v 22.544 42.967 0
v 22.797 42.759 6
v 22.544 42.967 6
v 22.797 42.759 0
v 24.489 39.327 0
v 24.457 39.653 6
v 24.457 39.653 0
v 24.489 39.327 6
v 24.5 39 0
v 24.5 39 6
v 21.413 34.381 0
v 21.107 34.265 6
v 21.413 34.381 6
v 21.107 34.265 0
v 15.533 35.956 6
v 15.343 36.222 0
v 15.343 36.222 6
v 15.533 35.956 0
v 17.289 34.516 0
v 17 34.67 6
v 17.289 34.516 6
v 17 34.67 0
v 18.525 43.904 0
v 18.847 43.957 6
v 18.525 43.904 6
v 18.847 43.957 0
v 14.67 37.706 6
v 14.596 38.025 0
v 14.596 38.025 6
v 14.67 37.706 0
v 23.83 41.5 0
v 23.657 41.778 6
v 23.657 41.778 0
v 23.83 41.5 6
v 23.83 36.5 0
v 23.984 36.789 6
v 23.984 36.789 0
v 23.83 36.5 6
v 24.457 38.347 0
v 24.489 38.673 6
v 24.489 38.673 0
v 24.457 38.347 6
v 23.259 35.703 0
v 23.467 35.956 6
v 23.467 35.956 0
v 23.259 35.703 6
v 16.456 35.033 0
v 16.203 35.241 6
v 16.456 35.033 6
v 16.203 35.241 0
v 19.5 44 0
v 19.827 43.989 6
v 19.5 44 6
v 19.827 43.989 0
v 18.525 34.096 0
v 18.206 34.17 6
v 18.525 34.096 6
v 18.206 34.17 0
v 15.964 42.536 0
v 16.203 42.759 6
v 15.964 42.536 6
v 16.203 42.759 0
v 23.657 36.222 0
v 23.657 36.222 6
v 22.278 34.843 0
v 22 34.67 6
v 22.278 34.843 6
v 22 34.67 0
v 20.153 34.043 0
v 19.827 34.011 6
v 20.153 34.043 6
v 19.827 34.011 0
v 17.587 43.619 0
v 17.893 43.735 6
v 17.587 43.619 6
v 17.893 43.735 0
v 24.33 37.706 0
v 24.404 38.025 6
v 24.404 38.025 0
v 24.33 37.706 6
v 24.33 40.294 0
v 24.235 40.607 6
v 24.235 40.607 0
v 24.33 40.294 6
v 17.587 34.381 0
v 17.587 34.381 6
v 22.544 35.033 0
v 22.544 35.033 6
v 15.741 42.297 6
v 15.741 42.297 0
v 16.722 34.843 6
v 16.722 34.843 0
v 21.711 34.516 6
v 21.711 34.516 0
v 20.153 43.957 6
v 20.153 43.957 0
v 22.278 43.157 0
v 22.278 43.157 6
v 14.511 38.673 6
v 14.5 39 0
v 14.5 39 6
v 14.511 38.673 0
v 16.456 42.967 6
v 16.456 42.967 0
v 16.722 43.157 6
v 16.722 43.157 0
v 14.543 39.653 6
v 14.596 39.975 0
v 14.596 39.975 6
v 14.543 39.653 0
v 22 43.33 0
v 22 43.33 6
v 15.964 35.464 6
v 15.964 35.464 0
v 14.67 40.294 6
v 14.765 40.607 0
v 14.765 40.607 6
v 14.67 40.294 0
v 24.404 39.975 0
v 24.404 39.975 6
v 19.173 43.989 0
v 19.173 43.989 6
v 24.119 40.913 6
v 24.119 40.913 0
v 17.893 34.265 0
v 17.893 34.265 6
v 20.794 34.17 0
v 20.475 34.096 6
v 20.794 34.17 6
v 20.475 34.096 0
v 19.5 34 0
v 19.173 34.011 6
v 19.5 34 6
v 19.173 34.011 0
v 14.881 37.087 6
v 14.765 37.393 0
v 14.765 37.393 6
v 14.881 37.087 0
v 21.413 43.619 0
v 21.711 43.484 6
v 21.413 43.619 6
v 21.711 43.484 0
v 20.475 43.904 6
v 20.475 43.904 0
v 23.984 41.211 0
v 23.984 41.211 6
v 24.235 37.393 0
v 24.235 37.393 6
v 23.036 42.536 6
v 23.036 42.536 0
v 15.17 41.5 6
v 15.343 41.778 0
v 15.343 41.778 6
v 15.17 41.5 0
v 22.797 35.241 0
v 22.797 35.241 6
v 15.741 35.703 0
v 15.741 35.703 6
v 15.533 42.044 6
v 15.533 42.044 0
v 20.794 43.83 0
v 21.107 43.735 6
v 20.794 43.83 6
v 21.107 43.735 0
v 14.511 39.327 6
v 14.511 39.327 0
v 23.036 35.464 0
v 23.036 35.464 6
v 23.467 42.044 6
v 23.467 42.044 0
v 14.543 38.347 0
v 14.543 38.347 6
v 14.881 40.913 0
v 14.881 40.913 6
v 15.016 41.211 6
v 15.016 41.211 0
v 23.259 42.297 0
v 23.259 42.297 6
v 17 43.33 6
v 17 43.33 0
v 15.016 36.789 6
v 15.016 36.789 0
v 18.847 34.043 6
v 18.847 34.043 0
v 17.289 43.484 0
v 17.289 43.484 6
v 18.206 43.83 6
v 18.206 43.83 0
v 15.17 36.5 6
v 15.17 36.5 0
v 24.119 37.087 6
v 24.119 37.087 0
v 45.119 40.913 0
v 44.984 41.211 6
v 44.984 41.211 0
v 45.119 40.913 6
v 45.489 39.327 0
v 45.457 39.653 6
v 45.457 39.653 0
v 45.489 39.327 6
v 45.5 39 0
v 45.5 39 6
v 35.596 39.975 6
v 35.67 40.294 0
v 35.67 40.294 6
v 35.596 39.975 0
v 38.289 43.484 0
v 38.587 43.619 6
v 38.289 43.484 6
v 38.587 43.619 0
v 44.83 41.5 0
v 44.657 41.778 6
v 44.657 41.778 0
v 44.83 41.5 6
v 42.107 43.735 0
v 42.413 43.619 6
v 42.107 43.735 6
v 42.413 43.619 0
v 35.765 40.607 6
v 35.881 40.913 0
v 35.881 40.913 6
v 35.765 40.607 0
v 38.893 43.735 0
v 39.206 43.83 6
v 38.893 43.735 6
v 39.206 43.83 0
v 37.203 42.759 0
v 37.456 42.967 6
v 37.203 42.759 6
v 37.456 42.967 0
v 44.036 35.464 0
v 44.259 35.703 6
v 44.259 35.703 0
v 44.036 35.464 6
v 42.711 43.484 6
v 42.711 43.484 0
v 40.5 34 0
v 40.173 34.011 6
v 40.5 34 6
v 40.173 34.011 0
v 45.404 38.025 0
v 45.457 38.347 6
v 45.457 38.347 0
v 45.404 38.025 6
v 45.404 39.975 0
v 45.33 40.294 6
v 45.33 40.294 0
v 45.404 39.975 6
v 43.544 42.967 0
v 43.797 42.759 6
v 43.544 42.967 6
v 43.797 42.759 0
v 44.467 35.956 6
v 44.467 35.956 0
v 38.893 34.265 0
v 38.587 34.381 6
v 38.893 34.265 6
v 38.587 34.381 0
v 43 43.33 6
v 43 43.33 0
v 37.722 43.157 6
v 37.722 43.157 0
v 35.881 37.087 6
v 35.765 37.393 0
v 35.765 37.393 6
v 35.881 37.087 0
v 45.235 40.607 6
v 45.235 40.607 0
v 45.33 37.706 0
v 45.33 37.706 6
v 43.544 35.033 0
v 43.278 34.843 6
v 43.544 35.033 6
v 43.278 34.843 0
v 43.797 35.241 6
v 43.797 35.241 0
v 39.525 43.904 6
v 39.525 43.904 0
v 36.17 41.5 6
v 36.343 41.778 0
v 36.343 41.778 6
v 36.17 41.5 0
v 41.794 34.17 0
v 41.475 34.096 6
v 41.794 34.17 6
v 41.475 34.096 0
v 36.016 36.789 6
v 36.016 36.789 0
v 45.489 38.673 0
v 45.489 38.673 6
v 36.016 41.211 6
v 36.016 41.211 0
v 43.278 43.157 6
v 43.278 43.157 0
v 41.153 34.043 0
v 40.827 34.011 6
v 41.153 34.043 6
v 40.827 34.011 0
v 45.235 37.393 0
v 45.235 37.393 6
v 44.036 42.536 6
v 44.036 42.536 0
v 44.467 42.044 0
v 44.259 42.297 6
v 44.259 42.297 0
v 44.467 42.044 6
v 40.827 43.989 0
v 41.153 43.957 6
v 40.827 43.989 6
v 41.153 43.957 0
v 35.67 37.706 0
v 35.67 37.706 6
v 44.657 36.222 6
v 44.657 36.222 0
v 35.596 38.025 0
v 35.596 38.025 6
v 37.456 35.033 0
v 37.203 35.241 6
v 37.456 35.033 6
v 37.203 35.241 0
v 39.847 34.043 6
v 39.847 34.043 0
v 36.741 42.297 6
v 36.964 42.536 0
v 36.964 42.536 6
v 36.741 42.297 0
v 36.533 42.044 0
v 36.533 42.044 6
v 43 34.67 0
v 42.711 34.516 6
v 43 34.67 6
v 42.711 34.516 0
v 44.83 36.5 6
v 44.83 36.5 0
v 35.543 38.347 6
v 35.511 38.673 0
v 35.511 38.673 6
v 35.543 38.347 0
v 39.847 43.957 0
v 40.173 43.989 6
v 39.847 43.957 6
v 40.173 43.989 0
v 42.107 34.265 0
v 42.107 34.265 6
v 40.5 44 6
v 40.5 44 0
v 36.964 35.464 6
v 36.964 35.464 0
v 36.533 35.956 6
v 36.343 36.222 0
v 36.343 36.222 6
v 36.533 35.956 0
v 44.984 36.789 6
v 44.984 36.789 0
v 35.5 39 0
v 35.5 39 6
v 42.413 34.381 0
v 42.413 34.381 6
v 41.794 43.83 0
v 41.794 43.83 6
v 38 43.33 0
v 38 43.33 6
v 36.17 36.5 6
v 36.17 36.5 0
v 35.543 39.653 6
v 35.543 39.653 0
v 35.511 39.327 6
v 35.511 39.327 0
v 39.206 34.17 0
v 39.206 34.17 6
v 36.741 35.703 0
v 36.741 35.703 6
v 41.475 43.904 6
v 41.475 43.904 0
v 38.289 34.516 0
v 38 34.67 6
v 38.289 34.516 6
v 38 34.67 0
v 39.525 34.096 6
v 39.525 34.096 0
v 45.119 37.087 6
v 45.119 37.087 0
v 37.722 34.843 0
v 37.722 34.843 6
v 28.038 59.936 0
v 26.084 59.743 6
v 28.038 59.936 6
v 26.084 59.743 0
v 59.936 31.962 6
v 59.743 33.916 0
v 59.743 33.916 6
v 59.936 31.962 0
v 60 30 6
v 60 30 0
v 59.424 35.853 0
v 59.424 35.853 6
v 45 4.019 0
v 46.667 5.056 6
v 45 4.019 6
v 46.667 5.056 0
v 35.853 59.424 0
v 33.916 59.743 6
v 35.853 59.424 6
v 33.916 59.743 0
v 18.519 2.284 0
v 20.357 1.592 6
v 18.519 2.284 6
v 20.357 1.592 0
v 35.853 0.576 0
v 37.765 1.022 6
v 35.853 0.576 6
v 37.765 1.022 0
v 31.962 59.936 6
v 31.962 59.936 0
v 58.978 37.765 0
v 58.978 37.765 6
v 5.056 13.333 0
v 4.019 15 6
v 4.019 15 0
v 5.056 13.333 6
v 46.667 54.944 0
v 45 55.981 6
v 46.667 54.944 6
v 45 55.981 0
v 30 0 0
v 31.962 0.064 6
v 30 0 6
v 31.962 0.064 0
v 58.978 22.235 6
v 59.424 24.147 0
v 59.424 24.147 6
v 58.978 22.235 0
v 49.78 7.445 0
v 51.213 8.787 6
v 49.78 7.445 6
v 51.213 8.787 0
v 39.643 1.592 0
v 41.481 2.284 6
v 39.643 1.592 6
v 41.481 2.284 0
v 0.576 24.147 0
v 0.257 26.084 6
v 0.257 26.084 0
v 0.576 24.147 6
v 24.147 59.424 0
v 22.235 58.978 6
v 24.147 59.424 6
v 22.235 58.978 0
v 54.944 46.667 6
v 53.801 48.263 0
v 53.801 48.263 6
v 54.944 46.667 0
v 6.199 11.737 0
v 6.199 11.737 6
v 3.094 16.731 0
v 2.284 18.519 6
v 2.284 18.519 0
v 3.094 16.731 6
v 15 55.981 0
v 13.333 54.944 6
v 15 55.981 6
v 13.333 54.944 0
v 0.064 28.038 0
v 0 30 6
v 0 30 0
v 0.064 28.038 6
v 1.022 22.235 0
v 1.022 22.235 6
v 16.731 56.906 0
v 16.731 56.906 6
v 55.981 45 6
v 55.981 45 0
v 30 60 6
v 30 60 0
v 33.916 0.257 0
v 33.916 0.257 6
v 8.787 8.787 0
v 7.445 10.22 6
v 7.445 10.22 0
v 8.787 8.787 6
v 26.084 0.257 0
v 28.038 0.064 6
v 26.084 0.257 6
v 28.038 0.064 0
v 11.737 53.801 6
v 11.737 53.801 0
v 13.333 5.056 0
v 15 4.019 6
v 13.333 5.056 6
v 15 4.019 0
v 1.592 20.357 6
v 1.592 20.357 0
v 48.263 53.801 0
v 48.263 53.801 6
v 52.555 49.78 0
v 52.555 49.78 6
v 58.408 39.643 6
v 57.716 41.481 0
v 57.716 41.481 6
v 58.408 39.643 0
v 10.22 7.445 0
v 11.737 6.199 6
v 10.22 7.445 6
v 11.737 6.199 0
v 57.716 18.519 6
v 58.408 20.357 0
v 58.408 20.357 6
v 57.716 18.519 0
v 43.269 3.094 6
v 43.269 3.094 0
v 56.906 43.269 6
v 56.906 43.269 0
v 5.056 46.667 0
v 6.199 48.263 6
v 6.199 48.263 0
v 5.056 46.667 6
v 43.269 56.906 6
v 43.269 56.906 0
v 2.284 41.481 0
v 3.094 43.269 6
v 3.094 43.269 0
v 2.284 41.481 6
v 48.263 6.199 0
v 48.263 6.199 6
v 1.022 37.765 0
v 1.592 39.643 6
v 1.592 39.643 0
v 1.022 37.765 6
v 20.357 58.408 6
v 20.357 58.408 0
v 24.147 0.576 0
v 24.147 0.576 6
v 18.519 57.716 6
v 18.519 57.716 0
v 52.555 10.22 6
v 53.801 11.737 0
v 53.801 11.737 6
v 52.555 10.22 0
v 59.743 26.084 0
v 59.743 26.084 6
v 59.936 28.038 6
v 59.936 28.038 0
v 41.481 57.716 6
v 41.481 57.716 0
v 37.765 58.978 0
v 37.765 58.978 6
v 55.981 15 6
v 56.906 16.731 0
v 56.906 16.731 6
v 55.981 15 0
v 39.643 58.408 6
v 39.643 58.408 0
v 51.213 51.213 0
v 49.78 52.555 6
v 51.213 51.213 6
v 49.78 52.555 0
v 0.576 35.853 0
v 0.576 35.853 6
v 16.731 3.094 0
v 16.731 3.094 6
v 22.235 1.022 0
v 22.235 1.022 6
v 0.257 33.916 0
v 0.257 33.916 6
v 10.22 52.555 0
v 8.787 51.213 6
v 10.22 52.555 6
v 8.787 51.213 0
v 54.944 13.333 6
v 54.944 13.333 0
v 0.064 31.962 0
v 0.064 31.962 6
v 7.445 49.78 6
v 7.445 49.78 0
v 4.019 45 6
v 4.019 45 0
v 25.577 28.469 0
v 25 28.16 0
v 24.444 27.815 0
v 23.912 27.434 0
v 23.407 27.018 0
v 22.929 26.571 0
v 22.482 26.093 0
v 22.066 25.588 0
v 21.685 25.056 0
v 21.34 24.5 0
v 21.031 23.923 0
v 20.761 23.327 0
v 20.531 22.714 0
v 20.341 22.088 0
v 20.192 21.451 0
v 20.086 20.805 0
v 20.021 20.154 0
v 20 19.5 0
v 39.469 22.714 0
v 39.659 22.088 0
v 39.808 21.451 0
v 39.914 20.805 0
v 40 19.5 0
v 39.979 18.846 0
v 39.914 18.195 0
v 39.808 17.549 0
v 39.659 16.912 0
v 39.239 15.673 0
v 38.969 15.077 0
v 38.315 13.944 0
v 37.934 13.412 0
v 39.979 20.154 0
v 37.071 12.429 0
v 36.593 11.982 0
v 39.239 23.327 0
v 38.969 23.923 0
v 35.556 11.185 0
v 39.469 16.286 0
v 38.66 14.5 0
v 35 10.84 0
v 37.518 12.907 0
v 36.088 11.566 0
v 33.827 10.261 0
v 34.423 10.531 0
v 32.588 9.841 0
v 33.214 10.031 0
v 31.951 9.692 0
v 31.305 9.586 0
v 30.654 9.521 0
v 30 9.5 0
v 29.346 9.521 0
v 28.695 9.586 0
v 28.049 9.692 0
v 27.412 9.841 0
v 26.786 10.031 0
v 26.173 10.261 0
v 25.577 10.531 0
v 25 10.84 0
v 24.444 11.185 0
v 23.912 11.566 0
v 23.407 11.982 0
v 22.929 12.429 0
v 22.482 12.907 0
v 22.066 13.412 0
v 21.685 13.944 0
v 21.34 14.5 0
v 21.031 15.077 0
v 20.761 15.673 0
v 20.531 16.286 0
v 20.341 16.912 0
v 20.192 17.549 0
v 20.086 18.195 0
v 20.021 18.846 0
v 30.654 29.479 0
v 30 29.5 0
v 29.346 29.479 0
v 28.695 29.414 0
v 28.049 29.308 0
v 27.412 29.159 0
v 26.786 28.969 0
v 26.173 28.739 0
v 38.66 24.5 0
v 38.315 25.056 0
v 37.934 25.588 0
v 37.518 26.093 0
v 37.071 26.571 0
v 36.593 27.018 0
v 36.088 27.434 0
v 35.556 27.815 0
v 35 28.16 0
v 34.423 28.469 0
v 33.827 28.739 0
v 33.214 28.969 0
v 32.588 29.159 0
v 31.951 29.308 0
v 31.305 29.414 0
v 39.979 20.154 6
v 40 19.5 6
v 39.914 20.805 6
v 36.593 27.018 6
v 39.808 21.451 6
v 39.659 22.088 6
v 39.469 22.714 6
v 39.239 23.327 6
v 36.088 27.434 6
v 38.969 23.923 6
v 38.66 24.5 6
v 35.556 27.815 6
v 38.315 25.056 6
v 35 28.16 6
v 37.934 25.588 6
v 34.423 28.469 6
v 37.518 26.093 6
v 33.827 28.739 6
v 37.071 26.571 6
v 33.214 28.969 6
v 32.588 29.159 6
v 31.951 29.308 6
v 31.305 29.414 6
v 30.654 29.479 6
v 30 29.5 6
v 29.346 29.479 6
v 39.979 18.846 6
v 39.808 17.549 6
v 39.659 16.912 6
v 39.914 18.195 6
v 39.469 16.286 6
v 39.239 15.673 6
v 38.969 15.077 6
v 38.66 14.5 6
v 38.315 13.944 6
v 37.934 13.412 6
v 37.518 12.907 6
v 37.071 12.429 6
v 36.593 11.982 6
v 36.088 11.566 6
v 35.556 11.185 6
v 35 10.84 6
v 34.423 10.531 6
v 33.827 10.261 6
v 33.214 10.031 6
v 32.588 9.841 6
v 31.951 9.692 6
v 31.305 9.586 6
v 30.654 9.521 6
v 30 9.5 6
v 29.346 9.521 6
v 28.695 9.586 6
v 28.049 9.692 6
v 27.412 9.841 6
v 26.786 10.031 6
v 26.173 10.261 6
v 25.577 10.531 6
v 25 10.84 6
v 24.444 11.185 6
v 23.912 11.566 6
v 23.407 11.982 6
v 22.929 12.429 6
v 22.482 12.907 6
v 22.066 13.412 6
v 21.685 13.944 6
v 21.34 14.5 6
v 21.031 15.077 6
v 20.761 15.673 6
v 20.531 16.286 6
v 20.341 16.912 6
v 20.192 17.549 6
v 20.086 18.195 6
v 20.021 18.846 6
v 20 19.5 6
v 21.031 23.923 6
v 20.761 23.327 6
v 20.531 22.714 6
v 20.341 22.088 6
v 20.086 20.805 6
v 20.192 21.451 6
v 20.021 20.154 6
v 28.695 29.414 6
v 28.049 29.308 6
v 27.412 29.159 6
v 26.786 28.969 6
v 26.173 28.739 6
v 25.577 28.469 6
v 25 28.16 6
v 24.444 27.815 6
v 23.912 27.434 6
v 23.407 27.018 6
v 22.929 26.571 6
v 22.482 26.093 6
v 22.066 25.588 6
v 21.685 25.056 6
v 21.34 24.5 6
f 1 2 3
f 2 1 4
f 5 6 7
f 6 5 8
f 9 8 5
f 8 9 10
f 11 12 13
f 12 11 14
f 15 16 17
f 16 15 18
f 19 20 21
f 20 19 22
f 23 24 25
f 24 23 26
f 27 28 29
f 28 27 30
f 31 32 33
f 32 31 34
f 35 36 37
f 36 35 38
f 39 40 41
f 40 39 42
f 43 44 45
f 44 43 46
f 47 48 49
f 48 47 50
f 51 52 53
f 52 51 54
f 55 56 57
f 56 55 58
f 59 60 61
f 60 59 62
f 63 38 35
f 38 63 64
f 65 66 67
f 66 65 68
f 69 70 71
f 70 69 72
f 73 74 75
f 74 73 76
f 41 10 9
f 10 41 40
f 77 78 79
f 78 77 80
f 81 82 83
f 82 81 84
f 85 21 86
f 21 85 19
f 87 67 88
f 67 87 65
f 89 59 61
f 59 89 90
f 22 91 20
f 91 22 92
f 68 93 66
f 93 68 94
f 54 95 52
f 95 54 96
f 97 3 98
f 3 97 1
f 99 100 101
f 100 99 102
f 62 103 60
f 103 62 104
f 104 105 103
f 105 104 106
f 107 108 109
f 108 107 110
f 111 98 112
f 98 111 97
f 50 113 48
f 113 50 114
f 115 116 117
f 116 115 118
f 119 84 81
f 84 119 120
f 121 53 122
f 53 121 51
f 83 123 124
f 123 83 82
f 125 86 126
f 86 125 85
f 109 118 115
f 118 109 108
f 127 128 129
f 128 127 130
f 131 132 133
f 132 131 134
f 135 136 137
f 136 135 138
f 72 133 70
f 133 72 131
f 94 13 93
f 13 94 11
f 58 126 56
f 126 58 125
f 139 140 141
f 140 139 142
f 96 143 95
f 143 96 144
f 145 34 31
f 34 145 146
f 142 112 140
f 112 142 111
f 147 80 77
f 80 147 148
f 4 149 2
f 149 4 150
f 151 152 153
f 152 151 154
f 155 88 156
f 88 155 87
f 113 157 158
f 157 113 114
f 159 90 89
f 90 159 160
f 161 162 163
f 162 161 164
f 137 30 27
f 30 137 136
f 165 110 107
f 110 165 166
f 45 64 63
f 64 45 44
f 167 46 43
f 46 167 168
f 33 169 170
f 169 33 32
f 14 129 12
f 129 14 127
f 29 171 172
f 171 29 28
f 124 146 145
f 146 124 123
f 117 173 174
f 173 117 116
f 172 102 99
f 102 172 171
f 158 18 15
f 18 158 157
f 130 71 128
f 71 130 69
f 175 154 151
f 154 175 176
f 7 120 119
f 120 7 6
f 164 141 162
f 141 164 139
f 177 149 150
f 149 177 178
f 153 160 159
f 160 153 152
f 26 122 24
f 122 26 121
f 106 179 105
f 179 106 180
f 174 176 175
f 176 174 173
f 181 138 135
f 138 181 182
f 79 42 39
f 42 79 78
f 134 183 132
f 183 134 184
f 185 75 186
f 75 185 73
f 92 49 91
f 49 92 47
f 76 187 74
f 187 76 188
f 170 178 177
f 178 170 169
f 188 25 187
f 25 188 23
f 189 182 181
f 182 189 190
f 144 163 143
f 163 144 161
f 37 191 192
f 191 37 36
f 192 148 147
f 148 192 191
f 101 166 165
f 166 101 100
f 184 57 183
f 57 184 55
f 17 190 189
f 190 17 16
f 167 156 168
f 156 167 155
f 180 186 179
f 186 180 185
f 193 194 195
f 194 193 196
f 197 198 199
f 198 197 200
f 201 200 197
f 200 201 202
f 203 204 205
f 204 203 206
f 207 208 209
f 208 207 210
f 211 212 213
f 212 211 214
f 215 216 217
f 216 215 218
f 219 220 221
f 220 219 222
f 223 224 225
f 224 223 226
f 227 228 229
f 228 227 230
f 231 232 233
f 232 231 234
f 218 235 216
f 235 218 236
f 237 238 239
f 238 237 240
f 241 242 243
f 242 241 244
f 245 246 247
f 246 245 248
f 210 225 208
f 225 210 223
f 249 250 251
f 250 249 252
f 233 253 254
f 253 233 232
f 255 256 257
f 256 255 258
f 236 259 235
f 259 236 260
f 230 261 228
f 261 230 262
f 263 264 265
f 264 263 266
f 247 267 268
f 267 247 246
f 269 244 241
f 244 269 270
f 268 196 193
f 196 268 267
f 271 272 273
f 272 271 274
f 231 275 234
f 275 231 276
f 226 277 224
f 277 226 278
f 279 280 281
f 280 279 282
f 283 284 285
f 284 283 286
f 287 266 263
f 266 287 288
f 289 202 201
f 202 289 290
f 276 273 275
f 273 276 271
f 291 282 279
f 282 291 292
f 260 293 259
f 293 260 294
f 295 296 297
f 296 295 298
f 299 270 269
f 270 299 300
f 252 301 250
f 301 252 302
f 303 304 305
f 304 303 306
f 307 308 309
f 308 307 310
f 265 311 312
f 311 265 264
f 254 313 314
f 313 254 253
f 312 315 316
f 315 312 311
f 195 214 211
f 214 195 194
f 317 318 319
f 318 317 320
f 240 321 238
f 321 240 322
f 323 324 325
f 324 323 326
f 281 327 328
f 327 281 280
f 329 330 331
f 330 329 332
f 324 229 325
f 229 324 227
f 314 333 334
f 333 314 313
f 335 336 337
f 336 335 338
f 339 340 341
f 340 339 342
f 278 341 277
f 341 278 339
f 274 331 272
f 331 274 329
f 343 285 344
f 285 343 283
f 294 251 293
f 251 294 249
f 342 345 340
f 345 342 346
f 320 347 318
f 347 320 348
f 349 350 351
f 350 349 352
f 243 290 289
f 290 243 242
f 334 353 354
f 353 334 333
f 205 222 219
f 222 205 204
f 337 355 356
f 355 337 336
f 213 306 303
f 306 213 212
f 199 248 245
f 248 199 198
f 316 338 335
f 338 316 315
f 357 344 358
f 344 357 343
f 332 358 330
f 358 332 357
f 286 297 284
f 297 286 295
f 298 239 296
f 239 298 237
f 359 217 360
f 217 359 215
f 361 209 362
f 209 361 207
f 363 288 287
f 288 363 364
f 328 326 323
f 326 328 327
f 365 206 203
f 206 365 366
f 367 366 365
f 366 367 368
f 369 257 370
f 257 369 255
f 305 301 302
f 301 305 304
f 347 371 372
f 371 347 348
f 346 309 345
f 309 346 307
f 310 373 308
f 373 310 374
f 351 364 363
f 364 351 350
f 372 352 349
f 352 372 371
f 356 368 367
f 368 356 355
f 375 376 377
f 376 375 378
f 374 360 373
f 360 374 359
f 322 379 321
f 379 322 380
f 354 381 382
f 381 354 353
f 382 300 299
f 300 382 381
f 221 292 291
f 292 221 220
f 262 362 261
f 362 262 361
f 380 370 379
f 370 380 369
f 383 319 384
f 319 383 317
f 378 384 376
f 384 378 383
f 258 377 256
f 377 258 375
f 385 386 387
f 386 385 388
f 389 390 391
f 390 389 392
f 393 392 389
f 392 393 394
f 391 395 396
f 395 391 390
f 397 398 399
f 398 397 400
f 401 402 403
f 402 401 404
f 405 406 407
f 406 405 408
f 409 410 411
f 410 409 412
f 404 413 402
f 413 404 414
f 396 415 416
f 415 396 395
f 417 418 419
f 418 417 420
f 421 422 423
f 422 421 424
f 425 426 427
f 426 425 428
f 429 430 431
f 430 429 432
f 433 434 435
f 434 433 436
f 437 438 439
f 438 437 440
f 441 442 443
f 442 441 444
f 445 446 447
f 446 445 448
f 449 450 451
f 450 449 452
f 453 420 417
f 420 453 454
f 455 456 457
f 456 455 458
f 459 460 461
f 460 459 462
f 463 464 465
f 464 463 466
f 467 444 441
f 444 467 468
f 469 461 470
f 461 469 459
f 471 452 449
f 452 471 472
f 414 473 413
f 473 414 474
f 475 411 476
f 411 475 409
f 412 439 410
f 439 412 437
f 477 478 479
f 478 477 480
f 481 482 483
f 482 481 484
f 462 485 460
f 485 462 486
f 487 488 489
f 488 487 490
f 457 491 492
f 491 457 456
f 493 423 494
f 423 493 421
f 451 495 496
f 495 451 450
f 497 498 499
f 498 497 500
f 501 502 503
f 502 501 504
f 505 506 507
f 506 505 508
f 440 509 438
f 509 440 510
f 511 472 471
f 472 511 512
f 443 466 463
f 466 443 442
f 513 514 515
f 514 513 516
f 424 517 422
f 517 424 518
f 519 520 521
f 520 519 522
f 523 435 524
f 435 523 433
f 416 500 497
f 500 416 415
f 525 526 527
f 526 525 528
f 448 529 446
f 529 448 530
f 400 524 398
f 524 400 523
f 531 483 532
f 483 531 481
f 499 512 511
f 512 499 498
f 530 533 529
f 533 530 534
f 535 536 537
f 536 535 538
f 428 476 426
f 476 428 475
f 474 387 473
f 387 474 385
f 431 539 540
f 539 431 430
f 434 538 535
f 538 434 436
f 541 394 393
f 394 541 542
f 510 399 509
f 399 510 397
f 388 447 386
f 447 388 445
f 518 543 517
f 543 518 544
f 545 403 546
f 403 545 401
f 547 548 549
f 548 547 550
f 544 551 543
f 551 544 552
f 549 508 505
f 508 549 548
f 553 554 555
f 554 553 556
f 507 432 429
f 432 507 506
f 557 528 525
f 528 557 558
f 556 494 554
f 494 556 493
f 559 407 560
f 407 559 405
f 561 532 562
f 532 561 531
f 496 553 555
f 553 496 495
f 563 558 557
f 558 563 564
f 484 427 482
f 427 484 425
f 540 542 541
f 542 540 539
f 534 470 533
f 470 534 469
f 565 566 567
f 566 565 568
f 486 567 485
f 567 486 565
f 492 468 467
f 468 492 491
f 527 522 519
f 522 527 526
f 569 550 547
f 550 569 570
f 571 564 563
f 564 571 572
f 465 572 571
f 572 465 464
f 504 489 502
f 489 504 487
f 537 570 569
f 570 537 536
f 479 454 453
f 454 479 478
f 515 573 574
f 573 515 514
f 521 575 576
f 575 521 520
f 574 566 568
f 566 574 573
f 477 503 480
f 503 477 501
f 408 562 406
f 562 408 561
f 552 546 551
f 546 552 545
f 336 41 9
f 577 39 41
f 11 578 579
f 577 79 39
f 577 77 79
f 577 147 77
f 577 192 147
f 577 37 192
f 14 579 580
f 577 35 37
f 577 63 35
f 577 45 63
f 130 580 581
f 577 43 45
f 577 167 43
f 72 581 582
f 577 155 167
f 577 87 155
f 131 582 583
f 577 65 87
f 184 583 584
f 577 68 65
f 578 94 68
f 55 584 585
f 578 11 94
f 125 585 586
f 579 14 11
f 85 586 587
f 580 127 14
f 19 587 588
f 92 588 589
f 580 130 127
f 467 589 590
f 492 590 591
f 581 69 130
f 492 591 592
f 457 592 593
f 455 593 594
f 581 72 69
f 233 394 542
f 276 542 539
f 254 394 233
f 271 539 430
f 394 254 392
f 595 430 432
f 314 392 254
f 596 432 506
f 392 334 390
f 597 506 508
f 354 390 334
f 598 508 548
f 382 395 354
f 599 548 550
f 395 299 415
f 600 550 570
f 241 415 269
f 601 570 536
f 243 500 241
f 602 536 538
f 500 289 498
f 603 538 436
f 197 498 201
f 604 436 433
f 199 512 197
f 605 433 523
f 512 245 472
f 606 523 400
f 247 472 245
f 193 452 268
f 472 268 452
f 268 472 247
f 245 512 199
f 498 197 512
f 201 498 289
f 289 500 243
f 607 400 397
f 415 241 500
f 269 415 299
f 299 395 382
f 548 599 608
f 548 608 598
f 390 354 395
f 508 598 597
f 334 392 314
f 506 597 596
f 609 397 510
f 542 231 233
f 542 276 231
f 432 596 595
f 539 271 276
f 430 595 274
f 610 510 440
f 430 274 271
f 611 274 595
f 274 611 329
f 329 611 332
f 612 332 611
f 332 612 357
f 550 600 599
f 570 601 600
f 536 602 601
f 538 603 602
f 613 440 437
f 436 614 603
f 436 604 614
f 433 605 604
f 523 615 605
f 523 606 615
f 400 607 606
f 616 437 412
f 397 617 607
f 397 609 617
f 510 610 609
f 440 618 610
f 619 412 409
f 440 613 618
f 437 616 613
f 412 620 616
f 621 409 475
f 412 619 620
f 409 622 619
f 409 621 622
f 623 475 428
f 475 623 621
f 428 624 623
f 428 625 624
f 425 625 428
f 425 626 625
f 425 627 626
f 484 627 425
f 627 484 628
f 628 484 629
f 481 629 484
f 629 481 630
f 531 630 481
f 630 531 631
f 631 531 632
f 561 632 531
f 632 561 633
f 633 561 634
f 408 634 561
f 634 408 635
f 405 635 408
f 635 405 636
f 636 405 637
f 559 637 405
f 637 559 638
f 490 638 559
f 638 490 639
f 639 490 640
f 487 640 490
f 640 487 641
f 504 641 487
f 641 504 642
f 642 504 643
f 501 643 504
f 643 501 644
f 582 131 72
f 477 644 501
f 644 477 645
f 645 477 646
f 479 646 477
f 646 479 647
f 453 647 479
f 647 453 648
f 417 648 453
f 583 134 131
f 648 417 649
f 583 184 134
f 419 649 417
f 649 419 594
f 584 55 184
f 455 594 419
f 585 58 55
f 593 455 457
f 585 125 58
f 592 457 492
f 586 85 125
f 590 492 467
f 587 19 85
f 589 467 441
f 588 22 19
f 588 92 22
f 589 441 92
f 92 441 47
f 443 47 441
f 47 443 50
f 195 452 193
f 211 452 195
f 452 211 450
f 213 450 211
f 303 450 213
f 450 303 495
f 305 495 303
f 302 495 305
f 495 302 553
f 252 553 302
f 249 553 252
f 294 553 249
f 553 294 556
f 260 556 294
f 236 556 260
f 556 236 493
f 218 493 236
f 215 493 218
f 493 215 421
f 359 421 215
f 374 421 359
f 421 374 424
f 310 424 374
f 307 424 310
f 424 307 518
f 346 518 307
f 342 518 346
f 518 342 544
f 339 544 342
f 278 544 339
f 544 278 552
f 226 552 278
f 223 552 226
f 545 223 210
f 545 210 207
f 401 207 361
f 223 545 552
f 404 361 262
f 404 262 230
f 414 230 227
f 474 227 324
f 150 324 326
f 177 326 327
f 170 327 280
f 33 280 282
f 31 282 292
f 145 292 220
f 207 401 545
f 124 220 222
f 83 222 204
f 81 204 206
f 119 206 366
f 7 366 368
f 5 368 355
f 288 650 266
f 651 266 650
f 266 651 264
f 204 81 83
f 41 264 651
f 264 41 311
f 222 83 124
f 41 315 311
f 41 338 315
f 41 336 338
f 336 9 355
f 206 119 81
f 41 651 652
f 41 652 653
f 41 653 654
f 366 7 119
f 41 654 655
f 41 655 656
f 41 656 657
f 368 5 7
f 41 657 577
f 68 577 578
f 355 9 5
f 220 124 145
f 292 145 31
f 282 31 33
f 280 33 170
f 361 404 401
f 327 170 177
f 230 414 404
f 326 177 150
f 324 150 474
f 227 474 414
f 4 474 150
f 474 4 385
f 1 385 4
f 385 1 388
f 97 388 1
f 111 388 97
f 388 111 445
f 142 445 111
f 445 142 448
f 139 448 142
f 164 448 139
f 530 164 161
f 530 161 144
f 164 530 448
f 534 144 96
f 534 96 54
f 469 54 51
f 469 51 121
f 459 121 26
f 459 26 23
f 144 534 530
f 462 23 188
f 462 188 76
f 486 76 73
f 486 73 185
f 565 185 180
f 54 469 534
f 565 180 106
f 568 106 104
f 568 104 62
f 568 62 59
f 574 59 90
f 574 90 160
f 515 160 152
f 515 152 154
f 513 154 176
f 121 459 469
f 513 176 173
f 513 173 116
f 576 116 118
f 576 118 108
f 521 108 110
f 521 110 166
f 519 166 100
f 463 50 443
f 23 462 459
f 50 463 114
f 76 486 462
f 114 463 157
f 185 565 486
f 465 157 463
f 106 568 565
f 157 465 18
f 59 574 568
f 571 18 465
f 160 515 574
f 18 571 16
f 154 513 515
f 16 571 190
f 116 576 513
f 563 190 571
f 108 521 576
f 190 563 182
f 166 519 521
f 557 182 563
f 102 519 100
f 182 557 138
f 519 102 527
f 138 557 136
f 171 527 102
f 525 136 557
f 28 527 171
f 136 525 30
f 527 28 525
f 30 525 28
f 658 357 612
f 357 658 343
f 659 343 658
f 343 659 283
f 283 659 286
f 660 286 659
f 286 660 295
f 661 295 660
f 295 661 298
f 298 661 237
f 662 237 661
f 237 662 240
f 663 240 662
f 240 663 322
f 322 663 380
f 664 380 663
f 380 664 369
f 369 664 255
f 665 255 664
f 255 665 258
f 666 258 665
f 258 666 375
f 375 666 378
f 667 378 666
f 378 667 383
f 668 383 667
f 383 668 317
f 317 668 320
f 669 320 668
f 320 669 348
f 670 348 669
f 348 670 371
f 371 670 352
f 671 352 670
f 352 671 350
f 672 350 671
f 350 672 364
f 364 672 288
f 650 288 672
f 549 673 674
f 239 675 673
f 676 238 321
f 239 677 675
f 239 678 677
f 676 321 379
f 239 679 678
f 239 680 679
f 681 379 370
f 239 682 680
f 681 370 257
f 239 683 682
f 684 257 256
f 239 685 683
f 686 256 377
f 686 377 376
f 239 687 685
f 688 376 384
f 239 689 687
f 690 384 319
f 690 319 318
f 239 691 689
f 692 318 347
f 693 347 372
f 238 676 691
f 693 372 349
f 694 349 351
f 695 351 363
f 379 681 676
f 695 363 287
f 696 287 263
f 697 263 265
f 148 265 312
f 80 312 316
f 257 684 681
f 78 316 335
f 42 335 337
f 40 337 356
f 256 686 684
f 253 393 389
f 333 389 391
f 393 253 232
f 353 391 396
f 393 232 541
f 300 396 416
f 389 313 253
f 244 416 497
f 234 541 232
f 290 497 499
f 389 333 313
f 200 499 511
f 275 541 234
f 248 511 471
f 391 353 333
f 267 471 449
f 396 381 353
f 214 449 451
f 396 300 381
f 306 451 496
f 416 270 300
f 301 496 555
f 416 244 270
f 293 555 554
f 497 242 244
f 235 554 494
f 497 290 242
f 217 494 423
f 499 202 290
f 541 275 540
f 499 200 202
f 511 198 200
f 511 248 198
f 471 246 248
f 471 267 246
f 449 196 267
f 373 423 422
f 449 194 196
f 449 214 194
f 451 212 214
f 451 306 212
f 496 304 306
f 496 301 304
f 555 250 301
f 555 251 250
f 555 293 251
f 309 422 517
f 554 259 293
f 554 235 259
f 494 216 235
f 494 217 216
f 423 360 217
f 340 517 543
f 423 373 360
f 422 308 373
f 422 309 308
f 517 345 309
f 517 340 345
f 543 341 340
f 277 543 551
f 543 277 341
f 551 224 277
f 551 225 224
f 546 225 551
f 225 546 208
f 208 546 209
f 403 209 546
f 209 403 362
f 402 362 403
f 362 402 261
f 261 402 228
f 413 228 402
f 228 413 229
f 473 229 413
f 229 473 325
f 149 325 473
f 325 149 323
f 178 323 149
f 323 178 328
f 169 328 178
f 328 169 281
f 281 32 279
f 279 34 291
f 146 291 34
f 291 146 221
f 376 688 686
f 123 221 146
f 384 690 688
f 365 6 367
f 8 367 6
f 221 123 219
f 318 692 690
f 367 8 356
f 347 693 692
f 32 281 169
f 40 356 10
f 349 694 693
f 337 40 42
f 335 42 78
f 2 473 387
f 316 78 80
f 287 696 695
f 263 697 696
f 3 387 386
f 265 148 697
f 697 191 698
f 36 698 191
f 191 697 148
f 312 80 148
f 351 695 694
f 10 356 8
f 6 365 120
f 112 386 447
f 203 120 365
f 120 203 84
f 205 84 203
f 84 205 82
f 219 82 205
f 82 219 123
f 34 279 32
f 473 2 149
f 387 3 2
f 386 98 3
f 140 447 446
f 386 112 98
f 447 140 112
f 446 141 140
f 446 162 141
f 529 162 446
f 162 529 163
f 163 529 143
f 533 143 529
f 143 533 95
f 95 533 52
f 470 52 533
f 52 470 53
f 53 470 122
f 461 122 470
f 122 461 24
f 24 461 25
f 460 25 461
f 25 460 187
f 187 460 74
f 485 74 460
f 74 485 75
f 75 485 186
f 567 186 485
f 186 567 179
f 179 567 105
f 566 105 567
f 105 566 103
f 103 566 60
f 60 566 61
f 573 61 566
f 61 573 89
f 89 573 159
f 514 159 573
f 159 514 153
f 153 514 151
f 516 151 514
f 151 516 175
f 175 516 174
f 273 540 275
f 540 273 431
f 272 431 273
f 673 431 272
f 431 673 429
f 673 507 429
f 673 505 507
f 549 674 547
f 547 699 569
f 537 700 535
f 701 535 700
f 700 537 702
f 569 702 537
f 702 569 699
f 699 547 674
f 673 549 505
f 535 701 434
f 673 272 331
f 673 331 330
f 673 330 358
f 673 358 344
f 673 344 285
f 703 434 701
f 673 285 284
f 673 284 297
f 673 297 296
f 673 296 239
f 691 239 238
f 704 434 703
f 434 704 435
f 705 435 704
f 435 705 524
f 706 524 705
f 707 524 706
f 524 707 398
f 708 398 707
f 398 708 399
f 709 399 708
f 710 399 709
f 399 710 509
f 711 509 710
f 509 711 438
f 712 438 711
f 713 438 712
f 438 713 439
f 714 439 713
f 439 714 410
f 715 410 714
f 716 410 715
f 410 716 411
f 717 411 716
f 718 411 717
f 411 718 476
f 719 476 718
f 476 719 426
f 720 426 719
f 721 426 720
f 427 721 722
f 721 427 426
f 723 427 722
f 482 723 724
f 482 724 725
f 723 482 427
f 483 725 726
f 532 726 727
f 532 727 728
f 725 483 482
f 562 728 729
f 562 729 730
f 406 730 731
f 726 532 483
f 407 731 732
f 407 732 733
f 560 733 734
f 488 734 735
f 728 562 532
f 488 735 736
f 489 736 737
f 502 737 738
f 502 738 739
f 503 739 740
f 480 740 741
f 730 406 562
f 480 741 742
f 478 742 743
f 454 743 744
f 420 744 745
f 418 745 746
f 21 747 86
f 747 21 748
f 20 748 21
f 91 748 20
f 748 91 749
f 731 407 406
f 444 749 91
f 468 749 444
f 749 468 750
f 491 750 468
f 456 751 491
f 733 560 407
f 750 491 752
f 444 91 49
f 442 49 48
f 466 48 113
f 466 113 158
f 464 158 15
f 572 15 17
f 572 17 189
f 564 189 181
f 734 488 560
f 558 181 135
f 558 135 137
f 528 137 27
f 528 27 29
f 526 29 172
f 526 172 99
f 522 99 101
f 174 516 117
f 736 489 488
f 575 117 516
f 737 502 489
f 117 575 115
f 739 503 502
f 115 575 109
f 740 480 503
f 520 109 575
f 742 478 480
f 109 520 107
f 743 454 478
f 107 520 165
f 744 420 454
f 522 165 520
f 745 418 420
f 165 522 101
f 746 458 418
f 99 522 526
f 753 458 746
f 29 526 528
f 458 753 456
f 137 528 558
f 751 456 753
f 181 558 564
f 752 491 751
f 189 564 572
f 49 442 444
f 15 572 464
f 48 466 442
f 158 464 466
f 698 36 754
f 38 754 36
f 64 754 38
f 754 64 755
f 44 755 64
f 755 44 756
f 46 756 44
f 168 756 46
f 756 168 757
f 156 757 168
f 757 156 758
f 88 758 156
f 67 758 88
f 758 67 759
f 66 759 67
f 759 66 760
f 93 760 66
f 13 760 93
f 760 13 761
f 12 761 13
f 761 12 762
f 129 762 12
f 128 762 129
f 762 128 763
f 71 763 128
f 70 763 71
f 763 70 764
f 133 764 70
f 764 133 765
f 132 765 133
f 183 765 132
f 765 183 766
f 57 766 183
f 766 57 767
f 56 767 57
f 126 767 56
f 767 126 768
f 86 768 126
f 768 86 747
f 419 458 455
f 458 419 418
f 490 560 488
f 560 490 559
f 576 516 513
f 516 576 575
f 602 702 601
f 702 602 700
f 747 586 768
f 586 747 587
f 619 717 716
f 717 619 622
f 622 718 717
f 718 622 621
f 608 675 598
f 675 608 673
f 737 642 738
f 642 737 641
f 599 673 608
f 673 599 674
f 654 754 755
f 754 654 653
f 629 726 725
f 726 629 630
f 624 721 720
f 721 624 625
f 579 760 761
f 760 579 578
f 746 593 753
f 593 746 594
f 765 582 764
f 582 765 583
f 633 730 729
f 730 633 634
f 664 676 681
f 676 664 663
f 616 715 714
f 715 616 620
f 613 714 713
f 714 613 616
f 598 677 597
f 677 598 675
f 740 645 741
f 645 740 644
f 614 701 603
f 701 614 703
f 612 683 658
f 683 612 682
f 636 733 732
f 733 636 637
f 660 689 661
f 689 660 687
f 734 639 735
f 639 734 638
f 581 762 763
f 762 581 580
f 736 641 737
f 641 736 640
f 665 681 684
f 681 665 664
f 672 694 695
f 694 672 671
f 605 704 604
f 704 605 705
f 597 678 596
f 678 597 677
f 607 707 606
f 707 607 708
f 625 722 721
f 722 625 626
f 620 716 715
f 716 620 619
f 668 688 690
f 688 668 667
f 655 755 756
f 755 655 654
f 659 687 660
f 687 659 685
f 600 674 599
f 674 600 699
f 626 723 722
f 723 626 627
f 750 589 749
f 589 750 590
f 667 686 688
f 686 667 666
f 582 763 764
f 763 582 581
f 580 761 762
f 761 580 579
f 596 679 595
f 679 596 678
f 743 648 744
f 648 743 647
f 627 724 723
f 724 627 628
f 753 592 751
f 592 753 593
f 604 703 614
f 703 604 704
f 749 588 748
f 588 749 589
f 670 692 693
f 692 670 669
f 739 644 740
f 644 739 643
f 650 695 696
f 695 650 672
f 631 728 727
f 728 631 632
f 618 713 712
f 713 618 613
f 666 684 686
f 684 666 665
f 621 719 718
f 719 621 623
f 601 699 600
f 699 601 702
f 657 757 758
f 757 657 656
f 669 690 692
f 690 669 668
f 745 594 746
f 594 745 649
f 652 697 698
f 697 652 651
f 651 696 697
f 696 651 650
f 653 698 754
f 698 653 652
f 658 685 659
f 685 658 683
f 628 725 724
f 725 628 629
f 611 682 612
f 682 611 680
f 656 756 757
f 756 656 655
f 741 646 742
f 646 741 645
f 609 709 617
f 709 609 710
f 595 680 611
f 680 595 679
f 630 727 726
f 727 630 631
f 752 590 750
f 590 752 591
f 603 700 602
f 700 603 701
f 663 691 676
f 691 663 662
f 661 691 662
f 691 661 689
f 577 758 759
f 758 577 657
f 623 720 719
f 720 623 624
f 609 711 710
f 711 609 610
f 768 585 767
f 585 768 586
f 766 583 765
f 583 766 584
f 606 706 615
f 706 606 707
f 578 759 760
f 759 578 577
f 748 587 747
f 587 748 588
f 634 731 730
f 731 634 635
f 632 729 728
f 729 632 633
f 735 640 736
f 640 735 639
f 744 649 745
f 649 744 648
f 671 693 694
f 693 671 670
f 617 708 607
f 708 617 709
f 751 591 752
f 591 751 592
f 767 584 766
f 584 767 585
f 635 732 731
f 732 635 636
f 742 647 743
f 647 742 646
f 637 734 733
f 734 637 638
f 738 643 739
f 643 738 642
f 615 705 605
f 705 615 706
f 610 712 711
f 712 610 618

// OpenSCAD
// Router emoji: the router's calibration piece, a 😮 -- a round face, two eyes and
// an open mouth, each a circle a person measures across with calipers. Its wrapper
// (apothecary/projects/parts/router_emoji.py) says the cuts that make it from its
// stock: the eyes and the mouth bored through, then the face cut around, in that
// order; this file draws the face those cuts leave.
//
// The face stands at the origin, its centre at (face_diameter / 2, face_diameter / 2)
// and its top at z = thickness. The toolpath's zero is the stock's front-left top
// corner: the stock is the face's square plus stock_margin on every side, so the
// face's centre is stock_margin further in, and its top is the toolpath's z = 0.
//
// Parameters:
//   face_diameter    the face, across: an outside size (mm)
//   eye_diameter     each eye, across: an inside size, wider than the 6 mm tool
//   mouth_diameter   the mouth, across: an inside size
//   thickness        the stock's, and the face's
//   stock_margin     stock beyond the face on each side: the toolpath's, not drawn

face_diameter = 60;    // [40:5:200] the face, across
eye_diameter = 10;     // [8:0.5:40] each eye, across
mouth_diameter = 20;   // [8:0.5:80] the mouth, across
thickness = 6;         // [3:1:40] the stock's thickness
stock_margin = 10;     // [0:1:50] stock beyond the face on every side (the toolpath's)

/* [Hidden] */
$fn = 96;

module face() {
    r = face_diameter / 2;
    translate([r, r, 0])
        difference() {
            cylinder(d = face_diameter, h = thickness);
            // The eyes, out and up from the centre, through.
            for (side = [-1, 1])
                translate([side * 0.35 * r, 0.3 * r, -1])
                    cylinder(d = eye_diameter, h = thickness + 2);
            // The mouth, down from the centre, through.
            translate([0, -0.35 * r, -1])
                cylinder(d = mouth_diameter, h = thickness + 2);
        }
}

face();
